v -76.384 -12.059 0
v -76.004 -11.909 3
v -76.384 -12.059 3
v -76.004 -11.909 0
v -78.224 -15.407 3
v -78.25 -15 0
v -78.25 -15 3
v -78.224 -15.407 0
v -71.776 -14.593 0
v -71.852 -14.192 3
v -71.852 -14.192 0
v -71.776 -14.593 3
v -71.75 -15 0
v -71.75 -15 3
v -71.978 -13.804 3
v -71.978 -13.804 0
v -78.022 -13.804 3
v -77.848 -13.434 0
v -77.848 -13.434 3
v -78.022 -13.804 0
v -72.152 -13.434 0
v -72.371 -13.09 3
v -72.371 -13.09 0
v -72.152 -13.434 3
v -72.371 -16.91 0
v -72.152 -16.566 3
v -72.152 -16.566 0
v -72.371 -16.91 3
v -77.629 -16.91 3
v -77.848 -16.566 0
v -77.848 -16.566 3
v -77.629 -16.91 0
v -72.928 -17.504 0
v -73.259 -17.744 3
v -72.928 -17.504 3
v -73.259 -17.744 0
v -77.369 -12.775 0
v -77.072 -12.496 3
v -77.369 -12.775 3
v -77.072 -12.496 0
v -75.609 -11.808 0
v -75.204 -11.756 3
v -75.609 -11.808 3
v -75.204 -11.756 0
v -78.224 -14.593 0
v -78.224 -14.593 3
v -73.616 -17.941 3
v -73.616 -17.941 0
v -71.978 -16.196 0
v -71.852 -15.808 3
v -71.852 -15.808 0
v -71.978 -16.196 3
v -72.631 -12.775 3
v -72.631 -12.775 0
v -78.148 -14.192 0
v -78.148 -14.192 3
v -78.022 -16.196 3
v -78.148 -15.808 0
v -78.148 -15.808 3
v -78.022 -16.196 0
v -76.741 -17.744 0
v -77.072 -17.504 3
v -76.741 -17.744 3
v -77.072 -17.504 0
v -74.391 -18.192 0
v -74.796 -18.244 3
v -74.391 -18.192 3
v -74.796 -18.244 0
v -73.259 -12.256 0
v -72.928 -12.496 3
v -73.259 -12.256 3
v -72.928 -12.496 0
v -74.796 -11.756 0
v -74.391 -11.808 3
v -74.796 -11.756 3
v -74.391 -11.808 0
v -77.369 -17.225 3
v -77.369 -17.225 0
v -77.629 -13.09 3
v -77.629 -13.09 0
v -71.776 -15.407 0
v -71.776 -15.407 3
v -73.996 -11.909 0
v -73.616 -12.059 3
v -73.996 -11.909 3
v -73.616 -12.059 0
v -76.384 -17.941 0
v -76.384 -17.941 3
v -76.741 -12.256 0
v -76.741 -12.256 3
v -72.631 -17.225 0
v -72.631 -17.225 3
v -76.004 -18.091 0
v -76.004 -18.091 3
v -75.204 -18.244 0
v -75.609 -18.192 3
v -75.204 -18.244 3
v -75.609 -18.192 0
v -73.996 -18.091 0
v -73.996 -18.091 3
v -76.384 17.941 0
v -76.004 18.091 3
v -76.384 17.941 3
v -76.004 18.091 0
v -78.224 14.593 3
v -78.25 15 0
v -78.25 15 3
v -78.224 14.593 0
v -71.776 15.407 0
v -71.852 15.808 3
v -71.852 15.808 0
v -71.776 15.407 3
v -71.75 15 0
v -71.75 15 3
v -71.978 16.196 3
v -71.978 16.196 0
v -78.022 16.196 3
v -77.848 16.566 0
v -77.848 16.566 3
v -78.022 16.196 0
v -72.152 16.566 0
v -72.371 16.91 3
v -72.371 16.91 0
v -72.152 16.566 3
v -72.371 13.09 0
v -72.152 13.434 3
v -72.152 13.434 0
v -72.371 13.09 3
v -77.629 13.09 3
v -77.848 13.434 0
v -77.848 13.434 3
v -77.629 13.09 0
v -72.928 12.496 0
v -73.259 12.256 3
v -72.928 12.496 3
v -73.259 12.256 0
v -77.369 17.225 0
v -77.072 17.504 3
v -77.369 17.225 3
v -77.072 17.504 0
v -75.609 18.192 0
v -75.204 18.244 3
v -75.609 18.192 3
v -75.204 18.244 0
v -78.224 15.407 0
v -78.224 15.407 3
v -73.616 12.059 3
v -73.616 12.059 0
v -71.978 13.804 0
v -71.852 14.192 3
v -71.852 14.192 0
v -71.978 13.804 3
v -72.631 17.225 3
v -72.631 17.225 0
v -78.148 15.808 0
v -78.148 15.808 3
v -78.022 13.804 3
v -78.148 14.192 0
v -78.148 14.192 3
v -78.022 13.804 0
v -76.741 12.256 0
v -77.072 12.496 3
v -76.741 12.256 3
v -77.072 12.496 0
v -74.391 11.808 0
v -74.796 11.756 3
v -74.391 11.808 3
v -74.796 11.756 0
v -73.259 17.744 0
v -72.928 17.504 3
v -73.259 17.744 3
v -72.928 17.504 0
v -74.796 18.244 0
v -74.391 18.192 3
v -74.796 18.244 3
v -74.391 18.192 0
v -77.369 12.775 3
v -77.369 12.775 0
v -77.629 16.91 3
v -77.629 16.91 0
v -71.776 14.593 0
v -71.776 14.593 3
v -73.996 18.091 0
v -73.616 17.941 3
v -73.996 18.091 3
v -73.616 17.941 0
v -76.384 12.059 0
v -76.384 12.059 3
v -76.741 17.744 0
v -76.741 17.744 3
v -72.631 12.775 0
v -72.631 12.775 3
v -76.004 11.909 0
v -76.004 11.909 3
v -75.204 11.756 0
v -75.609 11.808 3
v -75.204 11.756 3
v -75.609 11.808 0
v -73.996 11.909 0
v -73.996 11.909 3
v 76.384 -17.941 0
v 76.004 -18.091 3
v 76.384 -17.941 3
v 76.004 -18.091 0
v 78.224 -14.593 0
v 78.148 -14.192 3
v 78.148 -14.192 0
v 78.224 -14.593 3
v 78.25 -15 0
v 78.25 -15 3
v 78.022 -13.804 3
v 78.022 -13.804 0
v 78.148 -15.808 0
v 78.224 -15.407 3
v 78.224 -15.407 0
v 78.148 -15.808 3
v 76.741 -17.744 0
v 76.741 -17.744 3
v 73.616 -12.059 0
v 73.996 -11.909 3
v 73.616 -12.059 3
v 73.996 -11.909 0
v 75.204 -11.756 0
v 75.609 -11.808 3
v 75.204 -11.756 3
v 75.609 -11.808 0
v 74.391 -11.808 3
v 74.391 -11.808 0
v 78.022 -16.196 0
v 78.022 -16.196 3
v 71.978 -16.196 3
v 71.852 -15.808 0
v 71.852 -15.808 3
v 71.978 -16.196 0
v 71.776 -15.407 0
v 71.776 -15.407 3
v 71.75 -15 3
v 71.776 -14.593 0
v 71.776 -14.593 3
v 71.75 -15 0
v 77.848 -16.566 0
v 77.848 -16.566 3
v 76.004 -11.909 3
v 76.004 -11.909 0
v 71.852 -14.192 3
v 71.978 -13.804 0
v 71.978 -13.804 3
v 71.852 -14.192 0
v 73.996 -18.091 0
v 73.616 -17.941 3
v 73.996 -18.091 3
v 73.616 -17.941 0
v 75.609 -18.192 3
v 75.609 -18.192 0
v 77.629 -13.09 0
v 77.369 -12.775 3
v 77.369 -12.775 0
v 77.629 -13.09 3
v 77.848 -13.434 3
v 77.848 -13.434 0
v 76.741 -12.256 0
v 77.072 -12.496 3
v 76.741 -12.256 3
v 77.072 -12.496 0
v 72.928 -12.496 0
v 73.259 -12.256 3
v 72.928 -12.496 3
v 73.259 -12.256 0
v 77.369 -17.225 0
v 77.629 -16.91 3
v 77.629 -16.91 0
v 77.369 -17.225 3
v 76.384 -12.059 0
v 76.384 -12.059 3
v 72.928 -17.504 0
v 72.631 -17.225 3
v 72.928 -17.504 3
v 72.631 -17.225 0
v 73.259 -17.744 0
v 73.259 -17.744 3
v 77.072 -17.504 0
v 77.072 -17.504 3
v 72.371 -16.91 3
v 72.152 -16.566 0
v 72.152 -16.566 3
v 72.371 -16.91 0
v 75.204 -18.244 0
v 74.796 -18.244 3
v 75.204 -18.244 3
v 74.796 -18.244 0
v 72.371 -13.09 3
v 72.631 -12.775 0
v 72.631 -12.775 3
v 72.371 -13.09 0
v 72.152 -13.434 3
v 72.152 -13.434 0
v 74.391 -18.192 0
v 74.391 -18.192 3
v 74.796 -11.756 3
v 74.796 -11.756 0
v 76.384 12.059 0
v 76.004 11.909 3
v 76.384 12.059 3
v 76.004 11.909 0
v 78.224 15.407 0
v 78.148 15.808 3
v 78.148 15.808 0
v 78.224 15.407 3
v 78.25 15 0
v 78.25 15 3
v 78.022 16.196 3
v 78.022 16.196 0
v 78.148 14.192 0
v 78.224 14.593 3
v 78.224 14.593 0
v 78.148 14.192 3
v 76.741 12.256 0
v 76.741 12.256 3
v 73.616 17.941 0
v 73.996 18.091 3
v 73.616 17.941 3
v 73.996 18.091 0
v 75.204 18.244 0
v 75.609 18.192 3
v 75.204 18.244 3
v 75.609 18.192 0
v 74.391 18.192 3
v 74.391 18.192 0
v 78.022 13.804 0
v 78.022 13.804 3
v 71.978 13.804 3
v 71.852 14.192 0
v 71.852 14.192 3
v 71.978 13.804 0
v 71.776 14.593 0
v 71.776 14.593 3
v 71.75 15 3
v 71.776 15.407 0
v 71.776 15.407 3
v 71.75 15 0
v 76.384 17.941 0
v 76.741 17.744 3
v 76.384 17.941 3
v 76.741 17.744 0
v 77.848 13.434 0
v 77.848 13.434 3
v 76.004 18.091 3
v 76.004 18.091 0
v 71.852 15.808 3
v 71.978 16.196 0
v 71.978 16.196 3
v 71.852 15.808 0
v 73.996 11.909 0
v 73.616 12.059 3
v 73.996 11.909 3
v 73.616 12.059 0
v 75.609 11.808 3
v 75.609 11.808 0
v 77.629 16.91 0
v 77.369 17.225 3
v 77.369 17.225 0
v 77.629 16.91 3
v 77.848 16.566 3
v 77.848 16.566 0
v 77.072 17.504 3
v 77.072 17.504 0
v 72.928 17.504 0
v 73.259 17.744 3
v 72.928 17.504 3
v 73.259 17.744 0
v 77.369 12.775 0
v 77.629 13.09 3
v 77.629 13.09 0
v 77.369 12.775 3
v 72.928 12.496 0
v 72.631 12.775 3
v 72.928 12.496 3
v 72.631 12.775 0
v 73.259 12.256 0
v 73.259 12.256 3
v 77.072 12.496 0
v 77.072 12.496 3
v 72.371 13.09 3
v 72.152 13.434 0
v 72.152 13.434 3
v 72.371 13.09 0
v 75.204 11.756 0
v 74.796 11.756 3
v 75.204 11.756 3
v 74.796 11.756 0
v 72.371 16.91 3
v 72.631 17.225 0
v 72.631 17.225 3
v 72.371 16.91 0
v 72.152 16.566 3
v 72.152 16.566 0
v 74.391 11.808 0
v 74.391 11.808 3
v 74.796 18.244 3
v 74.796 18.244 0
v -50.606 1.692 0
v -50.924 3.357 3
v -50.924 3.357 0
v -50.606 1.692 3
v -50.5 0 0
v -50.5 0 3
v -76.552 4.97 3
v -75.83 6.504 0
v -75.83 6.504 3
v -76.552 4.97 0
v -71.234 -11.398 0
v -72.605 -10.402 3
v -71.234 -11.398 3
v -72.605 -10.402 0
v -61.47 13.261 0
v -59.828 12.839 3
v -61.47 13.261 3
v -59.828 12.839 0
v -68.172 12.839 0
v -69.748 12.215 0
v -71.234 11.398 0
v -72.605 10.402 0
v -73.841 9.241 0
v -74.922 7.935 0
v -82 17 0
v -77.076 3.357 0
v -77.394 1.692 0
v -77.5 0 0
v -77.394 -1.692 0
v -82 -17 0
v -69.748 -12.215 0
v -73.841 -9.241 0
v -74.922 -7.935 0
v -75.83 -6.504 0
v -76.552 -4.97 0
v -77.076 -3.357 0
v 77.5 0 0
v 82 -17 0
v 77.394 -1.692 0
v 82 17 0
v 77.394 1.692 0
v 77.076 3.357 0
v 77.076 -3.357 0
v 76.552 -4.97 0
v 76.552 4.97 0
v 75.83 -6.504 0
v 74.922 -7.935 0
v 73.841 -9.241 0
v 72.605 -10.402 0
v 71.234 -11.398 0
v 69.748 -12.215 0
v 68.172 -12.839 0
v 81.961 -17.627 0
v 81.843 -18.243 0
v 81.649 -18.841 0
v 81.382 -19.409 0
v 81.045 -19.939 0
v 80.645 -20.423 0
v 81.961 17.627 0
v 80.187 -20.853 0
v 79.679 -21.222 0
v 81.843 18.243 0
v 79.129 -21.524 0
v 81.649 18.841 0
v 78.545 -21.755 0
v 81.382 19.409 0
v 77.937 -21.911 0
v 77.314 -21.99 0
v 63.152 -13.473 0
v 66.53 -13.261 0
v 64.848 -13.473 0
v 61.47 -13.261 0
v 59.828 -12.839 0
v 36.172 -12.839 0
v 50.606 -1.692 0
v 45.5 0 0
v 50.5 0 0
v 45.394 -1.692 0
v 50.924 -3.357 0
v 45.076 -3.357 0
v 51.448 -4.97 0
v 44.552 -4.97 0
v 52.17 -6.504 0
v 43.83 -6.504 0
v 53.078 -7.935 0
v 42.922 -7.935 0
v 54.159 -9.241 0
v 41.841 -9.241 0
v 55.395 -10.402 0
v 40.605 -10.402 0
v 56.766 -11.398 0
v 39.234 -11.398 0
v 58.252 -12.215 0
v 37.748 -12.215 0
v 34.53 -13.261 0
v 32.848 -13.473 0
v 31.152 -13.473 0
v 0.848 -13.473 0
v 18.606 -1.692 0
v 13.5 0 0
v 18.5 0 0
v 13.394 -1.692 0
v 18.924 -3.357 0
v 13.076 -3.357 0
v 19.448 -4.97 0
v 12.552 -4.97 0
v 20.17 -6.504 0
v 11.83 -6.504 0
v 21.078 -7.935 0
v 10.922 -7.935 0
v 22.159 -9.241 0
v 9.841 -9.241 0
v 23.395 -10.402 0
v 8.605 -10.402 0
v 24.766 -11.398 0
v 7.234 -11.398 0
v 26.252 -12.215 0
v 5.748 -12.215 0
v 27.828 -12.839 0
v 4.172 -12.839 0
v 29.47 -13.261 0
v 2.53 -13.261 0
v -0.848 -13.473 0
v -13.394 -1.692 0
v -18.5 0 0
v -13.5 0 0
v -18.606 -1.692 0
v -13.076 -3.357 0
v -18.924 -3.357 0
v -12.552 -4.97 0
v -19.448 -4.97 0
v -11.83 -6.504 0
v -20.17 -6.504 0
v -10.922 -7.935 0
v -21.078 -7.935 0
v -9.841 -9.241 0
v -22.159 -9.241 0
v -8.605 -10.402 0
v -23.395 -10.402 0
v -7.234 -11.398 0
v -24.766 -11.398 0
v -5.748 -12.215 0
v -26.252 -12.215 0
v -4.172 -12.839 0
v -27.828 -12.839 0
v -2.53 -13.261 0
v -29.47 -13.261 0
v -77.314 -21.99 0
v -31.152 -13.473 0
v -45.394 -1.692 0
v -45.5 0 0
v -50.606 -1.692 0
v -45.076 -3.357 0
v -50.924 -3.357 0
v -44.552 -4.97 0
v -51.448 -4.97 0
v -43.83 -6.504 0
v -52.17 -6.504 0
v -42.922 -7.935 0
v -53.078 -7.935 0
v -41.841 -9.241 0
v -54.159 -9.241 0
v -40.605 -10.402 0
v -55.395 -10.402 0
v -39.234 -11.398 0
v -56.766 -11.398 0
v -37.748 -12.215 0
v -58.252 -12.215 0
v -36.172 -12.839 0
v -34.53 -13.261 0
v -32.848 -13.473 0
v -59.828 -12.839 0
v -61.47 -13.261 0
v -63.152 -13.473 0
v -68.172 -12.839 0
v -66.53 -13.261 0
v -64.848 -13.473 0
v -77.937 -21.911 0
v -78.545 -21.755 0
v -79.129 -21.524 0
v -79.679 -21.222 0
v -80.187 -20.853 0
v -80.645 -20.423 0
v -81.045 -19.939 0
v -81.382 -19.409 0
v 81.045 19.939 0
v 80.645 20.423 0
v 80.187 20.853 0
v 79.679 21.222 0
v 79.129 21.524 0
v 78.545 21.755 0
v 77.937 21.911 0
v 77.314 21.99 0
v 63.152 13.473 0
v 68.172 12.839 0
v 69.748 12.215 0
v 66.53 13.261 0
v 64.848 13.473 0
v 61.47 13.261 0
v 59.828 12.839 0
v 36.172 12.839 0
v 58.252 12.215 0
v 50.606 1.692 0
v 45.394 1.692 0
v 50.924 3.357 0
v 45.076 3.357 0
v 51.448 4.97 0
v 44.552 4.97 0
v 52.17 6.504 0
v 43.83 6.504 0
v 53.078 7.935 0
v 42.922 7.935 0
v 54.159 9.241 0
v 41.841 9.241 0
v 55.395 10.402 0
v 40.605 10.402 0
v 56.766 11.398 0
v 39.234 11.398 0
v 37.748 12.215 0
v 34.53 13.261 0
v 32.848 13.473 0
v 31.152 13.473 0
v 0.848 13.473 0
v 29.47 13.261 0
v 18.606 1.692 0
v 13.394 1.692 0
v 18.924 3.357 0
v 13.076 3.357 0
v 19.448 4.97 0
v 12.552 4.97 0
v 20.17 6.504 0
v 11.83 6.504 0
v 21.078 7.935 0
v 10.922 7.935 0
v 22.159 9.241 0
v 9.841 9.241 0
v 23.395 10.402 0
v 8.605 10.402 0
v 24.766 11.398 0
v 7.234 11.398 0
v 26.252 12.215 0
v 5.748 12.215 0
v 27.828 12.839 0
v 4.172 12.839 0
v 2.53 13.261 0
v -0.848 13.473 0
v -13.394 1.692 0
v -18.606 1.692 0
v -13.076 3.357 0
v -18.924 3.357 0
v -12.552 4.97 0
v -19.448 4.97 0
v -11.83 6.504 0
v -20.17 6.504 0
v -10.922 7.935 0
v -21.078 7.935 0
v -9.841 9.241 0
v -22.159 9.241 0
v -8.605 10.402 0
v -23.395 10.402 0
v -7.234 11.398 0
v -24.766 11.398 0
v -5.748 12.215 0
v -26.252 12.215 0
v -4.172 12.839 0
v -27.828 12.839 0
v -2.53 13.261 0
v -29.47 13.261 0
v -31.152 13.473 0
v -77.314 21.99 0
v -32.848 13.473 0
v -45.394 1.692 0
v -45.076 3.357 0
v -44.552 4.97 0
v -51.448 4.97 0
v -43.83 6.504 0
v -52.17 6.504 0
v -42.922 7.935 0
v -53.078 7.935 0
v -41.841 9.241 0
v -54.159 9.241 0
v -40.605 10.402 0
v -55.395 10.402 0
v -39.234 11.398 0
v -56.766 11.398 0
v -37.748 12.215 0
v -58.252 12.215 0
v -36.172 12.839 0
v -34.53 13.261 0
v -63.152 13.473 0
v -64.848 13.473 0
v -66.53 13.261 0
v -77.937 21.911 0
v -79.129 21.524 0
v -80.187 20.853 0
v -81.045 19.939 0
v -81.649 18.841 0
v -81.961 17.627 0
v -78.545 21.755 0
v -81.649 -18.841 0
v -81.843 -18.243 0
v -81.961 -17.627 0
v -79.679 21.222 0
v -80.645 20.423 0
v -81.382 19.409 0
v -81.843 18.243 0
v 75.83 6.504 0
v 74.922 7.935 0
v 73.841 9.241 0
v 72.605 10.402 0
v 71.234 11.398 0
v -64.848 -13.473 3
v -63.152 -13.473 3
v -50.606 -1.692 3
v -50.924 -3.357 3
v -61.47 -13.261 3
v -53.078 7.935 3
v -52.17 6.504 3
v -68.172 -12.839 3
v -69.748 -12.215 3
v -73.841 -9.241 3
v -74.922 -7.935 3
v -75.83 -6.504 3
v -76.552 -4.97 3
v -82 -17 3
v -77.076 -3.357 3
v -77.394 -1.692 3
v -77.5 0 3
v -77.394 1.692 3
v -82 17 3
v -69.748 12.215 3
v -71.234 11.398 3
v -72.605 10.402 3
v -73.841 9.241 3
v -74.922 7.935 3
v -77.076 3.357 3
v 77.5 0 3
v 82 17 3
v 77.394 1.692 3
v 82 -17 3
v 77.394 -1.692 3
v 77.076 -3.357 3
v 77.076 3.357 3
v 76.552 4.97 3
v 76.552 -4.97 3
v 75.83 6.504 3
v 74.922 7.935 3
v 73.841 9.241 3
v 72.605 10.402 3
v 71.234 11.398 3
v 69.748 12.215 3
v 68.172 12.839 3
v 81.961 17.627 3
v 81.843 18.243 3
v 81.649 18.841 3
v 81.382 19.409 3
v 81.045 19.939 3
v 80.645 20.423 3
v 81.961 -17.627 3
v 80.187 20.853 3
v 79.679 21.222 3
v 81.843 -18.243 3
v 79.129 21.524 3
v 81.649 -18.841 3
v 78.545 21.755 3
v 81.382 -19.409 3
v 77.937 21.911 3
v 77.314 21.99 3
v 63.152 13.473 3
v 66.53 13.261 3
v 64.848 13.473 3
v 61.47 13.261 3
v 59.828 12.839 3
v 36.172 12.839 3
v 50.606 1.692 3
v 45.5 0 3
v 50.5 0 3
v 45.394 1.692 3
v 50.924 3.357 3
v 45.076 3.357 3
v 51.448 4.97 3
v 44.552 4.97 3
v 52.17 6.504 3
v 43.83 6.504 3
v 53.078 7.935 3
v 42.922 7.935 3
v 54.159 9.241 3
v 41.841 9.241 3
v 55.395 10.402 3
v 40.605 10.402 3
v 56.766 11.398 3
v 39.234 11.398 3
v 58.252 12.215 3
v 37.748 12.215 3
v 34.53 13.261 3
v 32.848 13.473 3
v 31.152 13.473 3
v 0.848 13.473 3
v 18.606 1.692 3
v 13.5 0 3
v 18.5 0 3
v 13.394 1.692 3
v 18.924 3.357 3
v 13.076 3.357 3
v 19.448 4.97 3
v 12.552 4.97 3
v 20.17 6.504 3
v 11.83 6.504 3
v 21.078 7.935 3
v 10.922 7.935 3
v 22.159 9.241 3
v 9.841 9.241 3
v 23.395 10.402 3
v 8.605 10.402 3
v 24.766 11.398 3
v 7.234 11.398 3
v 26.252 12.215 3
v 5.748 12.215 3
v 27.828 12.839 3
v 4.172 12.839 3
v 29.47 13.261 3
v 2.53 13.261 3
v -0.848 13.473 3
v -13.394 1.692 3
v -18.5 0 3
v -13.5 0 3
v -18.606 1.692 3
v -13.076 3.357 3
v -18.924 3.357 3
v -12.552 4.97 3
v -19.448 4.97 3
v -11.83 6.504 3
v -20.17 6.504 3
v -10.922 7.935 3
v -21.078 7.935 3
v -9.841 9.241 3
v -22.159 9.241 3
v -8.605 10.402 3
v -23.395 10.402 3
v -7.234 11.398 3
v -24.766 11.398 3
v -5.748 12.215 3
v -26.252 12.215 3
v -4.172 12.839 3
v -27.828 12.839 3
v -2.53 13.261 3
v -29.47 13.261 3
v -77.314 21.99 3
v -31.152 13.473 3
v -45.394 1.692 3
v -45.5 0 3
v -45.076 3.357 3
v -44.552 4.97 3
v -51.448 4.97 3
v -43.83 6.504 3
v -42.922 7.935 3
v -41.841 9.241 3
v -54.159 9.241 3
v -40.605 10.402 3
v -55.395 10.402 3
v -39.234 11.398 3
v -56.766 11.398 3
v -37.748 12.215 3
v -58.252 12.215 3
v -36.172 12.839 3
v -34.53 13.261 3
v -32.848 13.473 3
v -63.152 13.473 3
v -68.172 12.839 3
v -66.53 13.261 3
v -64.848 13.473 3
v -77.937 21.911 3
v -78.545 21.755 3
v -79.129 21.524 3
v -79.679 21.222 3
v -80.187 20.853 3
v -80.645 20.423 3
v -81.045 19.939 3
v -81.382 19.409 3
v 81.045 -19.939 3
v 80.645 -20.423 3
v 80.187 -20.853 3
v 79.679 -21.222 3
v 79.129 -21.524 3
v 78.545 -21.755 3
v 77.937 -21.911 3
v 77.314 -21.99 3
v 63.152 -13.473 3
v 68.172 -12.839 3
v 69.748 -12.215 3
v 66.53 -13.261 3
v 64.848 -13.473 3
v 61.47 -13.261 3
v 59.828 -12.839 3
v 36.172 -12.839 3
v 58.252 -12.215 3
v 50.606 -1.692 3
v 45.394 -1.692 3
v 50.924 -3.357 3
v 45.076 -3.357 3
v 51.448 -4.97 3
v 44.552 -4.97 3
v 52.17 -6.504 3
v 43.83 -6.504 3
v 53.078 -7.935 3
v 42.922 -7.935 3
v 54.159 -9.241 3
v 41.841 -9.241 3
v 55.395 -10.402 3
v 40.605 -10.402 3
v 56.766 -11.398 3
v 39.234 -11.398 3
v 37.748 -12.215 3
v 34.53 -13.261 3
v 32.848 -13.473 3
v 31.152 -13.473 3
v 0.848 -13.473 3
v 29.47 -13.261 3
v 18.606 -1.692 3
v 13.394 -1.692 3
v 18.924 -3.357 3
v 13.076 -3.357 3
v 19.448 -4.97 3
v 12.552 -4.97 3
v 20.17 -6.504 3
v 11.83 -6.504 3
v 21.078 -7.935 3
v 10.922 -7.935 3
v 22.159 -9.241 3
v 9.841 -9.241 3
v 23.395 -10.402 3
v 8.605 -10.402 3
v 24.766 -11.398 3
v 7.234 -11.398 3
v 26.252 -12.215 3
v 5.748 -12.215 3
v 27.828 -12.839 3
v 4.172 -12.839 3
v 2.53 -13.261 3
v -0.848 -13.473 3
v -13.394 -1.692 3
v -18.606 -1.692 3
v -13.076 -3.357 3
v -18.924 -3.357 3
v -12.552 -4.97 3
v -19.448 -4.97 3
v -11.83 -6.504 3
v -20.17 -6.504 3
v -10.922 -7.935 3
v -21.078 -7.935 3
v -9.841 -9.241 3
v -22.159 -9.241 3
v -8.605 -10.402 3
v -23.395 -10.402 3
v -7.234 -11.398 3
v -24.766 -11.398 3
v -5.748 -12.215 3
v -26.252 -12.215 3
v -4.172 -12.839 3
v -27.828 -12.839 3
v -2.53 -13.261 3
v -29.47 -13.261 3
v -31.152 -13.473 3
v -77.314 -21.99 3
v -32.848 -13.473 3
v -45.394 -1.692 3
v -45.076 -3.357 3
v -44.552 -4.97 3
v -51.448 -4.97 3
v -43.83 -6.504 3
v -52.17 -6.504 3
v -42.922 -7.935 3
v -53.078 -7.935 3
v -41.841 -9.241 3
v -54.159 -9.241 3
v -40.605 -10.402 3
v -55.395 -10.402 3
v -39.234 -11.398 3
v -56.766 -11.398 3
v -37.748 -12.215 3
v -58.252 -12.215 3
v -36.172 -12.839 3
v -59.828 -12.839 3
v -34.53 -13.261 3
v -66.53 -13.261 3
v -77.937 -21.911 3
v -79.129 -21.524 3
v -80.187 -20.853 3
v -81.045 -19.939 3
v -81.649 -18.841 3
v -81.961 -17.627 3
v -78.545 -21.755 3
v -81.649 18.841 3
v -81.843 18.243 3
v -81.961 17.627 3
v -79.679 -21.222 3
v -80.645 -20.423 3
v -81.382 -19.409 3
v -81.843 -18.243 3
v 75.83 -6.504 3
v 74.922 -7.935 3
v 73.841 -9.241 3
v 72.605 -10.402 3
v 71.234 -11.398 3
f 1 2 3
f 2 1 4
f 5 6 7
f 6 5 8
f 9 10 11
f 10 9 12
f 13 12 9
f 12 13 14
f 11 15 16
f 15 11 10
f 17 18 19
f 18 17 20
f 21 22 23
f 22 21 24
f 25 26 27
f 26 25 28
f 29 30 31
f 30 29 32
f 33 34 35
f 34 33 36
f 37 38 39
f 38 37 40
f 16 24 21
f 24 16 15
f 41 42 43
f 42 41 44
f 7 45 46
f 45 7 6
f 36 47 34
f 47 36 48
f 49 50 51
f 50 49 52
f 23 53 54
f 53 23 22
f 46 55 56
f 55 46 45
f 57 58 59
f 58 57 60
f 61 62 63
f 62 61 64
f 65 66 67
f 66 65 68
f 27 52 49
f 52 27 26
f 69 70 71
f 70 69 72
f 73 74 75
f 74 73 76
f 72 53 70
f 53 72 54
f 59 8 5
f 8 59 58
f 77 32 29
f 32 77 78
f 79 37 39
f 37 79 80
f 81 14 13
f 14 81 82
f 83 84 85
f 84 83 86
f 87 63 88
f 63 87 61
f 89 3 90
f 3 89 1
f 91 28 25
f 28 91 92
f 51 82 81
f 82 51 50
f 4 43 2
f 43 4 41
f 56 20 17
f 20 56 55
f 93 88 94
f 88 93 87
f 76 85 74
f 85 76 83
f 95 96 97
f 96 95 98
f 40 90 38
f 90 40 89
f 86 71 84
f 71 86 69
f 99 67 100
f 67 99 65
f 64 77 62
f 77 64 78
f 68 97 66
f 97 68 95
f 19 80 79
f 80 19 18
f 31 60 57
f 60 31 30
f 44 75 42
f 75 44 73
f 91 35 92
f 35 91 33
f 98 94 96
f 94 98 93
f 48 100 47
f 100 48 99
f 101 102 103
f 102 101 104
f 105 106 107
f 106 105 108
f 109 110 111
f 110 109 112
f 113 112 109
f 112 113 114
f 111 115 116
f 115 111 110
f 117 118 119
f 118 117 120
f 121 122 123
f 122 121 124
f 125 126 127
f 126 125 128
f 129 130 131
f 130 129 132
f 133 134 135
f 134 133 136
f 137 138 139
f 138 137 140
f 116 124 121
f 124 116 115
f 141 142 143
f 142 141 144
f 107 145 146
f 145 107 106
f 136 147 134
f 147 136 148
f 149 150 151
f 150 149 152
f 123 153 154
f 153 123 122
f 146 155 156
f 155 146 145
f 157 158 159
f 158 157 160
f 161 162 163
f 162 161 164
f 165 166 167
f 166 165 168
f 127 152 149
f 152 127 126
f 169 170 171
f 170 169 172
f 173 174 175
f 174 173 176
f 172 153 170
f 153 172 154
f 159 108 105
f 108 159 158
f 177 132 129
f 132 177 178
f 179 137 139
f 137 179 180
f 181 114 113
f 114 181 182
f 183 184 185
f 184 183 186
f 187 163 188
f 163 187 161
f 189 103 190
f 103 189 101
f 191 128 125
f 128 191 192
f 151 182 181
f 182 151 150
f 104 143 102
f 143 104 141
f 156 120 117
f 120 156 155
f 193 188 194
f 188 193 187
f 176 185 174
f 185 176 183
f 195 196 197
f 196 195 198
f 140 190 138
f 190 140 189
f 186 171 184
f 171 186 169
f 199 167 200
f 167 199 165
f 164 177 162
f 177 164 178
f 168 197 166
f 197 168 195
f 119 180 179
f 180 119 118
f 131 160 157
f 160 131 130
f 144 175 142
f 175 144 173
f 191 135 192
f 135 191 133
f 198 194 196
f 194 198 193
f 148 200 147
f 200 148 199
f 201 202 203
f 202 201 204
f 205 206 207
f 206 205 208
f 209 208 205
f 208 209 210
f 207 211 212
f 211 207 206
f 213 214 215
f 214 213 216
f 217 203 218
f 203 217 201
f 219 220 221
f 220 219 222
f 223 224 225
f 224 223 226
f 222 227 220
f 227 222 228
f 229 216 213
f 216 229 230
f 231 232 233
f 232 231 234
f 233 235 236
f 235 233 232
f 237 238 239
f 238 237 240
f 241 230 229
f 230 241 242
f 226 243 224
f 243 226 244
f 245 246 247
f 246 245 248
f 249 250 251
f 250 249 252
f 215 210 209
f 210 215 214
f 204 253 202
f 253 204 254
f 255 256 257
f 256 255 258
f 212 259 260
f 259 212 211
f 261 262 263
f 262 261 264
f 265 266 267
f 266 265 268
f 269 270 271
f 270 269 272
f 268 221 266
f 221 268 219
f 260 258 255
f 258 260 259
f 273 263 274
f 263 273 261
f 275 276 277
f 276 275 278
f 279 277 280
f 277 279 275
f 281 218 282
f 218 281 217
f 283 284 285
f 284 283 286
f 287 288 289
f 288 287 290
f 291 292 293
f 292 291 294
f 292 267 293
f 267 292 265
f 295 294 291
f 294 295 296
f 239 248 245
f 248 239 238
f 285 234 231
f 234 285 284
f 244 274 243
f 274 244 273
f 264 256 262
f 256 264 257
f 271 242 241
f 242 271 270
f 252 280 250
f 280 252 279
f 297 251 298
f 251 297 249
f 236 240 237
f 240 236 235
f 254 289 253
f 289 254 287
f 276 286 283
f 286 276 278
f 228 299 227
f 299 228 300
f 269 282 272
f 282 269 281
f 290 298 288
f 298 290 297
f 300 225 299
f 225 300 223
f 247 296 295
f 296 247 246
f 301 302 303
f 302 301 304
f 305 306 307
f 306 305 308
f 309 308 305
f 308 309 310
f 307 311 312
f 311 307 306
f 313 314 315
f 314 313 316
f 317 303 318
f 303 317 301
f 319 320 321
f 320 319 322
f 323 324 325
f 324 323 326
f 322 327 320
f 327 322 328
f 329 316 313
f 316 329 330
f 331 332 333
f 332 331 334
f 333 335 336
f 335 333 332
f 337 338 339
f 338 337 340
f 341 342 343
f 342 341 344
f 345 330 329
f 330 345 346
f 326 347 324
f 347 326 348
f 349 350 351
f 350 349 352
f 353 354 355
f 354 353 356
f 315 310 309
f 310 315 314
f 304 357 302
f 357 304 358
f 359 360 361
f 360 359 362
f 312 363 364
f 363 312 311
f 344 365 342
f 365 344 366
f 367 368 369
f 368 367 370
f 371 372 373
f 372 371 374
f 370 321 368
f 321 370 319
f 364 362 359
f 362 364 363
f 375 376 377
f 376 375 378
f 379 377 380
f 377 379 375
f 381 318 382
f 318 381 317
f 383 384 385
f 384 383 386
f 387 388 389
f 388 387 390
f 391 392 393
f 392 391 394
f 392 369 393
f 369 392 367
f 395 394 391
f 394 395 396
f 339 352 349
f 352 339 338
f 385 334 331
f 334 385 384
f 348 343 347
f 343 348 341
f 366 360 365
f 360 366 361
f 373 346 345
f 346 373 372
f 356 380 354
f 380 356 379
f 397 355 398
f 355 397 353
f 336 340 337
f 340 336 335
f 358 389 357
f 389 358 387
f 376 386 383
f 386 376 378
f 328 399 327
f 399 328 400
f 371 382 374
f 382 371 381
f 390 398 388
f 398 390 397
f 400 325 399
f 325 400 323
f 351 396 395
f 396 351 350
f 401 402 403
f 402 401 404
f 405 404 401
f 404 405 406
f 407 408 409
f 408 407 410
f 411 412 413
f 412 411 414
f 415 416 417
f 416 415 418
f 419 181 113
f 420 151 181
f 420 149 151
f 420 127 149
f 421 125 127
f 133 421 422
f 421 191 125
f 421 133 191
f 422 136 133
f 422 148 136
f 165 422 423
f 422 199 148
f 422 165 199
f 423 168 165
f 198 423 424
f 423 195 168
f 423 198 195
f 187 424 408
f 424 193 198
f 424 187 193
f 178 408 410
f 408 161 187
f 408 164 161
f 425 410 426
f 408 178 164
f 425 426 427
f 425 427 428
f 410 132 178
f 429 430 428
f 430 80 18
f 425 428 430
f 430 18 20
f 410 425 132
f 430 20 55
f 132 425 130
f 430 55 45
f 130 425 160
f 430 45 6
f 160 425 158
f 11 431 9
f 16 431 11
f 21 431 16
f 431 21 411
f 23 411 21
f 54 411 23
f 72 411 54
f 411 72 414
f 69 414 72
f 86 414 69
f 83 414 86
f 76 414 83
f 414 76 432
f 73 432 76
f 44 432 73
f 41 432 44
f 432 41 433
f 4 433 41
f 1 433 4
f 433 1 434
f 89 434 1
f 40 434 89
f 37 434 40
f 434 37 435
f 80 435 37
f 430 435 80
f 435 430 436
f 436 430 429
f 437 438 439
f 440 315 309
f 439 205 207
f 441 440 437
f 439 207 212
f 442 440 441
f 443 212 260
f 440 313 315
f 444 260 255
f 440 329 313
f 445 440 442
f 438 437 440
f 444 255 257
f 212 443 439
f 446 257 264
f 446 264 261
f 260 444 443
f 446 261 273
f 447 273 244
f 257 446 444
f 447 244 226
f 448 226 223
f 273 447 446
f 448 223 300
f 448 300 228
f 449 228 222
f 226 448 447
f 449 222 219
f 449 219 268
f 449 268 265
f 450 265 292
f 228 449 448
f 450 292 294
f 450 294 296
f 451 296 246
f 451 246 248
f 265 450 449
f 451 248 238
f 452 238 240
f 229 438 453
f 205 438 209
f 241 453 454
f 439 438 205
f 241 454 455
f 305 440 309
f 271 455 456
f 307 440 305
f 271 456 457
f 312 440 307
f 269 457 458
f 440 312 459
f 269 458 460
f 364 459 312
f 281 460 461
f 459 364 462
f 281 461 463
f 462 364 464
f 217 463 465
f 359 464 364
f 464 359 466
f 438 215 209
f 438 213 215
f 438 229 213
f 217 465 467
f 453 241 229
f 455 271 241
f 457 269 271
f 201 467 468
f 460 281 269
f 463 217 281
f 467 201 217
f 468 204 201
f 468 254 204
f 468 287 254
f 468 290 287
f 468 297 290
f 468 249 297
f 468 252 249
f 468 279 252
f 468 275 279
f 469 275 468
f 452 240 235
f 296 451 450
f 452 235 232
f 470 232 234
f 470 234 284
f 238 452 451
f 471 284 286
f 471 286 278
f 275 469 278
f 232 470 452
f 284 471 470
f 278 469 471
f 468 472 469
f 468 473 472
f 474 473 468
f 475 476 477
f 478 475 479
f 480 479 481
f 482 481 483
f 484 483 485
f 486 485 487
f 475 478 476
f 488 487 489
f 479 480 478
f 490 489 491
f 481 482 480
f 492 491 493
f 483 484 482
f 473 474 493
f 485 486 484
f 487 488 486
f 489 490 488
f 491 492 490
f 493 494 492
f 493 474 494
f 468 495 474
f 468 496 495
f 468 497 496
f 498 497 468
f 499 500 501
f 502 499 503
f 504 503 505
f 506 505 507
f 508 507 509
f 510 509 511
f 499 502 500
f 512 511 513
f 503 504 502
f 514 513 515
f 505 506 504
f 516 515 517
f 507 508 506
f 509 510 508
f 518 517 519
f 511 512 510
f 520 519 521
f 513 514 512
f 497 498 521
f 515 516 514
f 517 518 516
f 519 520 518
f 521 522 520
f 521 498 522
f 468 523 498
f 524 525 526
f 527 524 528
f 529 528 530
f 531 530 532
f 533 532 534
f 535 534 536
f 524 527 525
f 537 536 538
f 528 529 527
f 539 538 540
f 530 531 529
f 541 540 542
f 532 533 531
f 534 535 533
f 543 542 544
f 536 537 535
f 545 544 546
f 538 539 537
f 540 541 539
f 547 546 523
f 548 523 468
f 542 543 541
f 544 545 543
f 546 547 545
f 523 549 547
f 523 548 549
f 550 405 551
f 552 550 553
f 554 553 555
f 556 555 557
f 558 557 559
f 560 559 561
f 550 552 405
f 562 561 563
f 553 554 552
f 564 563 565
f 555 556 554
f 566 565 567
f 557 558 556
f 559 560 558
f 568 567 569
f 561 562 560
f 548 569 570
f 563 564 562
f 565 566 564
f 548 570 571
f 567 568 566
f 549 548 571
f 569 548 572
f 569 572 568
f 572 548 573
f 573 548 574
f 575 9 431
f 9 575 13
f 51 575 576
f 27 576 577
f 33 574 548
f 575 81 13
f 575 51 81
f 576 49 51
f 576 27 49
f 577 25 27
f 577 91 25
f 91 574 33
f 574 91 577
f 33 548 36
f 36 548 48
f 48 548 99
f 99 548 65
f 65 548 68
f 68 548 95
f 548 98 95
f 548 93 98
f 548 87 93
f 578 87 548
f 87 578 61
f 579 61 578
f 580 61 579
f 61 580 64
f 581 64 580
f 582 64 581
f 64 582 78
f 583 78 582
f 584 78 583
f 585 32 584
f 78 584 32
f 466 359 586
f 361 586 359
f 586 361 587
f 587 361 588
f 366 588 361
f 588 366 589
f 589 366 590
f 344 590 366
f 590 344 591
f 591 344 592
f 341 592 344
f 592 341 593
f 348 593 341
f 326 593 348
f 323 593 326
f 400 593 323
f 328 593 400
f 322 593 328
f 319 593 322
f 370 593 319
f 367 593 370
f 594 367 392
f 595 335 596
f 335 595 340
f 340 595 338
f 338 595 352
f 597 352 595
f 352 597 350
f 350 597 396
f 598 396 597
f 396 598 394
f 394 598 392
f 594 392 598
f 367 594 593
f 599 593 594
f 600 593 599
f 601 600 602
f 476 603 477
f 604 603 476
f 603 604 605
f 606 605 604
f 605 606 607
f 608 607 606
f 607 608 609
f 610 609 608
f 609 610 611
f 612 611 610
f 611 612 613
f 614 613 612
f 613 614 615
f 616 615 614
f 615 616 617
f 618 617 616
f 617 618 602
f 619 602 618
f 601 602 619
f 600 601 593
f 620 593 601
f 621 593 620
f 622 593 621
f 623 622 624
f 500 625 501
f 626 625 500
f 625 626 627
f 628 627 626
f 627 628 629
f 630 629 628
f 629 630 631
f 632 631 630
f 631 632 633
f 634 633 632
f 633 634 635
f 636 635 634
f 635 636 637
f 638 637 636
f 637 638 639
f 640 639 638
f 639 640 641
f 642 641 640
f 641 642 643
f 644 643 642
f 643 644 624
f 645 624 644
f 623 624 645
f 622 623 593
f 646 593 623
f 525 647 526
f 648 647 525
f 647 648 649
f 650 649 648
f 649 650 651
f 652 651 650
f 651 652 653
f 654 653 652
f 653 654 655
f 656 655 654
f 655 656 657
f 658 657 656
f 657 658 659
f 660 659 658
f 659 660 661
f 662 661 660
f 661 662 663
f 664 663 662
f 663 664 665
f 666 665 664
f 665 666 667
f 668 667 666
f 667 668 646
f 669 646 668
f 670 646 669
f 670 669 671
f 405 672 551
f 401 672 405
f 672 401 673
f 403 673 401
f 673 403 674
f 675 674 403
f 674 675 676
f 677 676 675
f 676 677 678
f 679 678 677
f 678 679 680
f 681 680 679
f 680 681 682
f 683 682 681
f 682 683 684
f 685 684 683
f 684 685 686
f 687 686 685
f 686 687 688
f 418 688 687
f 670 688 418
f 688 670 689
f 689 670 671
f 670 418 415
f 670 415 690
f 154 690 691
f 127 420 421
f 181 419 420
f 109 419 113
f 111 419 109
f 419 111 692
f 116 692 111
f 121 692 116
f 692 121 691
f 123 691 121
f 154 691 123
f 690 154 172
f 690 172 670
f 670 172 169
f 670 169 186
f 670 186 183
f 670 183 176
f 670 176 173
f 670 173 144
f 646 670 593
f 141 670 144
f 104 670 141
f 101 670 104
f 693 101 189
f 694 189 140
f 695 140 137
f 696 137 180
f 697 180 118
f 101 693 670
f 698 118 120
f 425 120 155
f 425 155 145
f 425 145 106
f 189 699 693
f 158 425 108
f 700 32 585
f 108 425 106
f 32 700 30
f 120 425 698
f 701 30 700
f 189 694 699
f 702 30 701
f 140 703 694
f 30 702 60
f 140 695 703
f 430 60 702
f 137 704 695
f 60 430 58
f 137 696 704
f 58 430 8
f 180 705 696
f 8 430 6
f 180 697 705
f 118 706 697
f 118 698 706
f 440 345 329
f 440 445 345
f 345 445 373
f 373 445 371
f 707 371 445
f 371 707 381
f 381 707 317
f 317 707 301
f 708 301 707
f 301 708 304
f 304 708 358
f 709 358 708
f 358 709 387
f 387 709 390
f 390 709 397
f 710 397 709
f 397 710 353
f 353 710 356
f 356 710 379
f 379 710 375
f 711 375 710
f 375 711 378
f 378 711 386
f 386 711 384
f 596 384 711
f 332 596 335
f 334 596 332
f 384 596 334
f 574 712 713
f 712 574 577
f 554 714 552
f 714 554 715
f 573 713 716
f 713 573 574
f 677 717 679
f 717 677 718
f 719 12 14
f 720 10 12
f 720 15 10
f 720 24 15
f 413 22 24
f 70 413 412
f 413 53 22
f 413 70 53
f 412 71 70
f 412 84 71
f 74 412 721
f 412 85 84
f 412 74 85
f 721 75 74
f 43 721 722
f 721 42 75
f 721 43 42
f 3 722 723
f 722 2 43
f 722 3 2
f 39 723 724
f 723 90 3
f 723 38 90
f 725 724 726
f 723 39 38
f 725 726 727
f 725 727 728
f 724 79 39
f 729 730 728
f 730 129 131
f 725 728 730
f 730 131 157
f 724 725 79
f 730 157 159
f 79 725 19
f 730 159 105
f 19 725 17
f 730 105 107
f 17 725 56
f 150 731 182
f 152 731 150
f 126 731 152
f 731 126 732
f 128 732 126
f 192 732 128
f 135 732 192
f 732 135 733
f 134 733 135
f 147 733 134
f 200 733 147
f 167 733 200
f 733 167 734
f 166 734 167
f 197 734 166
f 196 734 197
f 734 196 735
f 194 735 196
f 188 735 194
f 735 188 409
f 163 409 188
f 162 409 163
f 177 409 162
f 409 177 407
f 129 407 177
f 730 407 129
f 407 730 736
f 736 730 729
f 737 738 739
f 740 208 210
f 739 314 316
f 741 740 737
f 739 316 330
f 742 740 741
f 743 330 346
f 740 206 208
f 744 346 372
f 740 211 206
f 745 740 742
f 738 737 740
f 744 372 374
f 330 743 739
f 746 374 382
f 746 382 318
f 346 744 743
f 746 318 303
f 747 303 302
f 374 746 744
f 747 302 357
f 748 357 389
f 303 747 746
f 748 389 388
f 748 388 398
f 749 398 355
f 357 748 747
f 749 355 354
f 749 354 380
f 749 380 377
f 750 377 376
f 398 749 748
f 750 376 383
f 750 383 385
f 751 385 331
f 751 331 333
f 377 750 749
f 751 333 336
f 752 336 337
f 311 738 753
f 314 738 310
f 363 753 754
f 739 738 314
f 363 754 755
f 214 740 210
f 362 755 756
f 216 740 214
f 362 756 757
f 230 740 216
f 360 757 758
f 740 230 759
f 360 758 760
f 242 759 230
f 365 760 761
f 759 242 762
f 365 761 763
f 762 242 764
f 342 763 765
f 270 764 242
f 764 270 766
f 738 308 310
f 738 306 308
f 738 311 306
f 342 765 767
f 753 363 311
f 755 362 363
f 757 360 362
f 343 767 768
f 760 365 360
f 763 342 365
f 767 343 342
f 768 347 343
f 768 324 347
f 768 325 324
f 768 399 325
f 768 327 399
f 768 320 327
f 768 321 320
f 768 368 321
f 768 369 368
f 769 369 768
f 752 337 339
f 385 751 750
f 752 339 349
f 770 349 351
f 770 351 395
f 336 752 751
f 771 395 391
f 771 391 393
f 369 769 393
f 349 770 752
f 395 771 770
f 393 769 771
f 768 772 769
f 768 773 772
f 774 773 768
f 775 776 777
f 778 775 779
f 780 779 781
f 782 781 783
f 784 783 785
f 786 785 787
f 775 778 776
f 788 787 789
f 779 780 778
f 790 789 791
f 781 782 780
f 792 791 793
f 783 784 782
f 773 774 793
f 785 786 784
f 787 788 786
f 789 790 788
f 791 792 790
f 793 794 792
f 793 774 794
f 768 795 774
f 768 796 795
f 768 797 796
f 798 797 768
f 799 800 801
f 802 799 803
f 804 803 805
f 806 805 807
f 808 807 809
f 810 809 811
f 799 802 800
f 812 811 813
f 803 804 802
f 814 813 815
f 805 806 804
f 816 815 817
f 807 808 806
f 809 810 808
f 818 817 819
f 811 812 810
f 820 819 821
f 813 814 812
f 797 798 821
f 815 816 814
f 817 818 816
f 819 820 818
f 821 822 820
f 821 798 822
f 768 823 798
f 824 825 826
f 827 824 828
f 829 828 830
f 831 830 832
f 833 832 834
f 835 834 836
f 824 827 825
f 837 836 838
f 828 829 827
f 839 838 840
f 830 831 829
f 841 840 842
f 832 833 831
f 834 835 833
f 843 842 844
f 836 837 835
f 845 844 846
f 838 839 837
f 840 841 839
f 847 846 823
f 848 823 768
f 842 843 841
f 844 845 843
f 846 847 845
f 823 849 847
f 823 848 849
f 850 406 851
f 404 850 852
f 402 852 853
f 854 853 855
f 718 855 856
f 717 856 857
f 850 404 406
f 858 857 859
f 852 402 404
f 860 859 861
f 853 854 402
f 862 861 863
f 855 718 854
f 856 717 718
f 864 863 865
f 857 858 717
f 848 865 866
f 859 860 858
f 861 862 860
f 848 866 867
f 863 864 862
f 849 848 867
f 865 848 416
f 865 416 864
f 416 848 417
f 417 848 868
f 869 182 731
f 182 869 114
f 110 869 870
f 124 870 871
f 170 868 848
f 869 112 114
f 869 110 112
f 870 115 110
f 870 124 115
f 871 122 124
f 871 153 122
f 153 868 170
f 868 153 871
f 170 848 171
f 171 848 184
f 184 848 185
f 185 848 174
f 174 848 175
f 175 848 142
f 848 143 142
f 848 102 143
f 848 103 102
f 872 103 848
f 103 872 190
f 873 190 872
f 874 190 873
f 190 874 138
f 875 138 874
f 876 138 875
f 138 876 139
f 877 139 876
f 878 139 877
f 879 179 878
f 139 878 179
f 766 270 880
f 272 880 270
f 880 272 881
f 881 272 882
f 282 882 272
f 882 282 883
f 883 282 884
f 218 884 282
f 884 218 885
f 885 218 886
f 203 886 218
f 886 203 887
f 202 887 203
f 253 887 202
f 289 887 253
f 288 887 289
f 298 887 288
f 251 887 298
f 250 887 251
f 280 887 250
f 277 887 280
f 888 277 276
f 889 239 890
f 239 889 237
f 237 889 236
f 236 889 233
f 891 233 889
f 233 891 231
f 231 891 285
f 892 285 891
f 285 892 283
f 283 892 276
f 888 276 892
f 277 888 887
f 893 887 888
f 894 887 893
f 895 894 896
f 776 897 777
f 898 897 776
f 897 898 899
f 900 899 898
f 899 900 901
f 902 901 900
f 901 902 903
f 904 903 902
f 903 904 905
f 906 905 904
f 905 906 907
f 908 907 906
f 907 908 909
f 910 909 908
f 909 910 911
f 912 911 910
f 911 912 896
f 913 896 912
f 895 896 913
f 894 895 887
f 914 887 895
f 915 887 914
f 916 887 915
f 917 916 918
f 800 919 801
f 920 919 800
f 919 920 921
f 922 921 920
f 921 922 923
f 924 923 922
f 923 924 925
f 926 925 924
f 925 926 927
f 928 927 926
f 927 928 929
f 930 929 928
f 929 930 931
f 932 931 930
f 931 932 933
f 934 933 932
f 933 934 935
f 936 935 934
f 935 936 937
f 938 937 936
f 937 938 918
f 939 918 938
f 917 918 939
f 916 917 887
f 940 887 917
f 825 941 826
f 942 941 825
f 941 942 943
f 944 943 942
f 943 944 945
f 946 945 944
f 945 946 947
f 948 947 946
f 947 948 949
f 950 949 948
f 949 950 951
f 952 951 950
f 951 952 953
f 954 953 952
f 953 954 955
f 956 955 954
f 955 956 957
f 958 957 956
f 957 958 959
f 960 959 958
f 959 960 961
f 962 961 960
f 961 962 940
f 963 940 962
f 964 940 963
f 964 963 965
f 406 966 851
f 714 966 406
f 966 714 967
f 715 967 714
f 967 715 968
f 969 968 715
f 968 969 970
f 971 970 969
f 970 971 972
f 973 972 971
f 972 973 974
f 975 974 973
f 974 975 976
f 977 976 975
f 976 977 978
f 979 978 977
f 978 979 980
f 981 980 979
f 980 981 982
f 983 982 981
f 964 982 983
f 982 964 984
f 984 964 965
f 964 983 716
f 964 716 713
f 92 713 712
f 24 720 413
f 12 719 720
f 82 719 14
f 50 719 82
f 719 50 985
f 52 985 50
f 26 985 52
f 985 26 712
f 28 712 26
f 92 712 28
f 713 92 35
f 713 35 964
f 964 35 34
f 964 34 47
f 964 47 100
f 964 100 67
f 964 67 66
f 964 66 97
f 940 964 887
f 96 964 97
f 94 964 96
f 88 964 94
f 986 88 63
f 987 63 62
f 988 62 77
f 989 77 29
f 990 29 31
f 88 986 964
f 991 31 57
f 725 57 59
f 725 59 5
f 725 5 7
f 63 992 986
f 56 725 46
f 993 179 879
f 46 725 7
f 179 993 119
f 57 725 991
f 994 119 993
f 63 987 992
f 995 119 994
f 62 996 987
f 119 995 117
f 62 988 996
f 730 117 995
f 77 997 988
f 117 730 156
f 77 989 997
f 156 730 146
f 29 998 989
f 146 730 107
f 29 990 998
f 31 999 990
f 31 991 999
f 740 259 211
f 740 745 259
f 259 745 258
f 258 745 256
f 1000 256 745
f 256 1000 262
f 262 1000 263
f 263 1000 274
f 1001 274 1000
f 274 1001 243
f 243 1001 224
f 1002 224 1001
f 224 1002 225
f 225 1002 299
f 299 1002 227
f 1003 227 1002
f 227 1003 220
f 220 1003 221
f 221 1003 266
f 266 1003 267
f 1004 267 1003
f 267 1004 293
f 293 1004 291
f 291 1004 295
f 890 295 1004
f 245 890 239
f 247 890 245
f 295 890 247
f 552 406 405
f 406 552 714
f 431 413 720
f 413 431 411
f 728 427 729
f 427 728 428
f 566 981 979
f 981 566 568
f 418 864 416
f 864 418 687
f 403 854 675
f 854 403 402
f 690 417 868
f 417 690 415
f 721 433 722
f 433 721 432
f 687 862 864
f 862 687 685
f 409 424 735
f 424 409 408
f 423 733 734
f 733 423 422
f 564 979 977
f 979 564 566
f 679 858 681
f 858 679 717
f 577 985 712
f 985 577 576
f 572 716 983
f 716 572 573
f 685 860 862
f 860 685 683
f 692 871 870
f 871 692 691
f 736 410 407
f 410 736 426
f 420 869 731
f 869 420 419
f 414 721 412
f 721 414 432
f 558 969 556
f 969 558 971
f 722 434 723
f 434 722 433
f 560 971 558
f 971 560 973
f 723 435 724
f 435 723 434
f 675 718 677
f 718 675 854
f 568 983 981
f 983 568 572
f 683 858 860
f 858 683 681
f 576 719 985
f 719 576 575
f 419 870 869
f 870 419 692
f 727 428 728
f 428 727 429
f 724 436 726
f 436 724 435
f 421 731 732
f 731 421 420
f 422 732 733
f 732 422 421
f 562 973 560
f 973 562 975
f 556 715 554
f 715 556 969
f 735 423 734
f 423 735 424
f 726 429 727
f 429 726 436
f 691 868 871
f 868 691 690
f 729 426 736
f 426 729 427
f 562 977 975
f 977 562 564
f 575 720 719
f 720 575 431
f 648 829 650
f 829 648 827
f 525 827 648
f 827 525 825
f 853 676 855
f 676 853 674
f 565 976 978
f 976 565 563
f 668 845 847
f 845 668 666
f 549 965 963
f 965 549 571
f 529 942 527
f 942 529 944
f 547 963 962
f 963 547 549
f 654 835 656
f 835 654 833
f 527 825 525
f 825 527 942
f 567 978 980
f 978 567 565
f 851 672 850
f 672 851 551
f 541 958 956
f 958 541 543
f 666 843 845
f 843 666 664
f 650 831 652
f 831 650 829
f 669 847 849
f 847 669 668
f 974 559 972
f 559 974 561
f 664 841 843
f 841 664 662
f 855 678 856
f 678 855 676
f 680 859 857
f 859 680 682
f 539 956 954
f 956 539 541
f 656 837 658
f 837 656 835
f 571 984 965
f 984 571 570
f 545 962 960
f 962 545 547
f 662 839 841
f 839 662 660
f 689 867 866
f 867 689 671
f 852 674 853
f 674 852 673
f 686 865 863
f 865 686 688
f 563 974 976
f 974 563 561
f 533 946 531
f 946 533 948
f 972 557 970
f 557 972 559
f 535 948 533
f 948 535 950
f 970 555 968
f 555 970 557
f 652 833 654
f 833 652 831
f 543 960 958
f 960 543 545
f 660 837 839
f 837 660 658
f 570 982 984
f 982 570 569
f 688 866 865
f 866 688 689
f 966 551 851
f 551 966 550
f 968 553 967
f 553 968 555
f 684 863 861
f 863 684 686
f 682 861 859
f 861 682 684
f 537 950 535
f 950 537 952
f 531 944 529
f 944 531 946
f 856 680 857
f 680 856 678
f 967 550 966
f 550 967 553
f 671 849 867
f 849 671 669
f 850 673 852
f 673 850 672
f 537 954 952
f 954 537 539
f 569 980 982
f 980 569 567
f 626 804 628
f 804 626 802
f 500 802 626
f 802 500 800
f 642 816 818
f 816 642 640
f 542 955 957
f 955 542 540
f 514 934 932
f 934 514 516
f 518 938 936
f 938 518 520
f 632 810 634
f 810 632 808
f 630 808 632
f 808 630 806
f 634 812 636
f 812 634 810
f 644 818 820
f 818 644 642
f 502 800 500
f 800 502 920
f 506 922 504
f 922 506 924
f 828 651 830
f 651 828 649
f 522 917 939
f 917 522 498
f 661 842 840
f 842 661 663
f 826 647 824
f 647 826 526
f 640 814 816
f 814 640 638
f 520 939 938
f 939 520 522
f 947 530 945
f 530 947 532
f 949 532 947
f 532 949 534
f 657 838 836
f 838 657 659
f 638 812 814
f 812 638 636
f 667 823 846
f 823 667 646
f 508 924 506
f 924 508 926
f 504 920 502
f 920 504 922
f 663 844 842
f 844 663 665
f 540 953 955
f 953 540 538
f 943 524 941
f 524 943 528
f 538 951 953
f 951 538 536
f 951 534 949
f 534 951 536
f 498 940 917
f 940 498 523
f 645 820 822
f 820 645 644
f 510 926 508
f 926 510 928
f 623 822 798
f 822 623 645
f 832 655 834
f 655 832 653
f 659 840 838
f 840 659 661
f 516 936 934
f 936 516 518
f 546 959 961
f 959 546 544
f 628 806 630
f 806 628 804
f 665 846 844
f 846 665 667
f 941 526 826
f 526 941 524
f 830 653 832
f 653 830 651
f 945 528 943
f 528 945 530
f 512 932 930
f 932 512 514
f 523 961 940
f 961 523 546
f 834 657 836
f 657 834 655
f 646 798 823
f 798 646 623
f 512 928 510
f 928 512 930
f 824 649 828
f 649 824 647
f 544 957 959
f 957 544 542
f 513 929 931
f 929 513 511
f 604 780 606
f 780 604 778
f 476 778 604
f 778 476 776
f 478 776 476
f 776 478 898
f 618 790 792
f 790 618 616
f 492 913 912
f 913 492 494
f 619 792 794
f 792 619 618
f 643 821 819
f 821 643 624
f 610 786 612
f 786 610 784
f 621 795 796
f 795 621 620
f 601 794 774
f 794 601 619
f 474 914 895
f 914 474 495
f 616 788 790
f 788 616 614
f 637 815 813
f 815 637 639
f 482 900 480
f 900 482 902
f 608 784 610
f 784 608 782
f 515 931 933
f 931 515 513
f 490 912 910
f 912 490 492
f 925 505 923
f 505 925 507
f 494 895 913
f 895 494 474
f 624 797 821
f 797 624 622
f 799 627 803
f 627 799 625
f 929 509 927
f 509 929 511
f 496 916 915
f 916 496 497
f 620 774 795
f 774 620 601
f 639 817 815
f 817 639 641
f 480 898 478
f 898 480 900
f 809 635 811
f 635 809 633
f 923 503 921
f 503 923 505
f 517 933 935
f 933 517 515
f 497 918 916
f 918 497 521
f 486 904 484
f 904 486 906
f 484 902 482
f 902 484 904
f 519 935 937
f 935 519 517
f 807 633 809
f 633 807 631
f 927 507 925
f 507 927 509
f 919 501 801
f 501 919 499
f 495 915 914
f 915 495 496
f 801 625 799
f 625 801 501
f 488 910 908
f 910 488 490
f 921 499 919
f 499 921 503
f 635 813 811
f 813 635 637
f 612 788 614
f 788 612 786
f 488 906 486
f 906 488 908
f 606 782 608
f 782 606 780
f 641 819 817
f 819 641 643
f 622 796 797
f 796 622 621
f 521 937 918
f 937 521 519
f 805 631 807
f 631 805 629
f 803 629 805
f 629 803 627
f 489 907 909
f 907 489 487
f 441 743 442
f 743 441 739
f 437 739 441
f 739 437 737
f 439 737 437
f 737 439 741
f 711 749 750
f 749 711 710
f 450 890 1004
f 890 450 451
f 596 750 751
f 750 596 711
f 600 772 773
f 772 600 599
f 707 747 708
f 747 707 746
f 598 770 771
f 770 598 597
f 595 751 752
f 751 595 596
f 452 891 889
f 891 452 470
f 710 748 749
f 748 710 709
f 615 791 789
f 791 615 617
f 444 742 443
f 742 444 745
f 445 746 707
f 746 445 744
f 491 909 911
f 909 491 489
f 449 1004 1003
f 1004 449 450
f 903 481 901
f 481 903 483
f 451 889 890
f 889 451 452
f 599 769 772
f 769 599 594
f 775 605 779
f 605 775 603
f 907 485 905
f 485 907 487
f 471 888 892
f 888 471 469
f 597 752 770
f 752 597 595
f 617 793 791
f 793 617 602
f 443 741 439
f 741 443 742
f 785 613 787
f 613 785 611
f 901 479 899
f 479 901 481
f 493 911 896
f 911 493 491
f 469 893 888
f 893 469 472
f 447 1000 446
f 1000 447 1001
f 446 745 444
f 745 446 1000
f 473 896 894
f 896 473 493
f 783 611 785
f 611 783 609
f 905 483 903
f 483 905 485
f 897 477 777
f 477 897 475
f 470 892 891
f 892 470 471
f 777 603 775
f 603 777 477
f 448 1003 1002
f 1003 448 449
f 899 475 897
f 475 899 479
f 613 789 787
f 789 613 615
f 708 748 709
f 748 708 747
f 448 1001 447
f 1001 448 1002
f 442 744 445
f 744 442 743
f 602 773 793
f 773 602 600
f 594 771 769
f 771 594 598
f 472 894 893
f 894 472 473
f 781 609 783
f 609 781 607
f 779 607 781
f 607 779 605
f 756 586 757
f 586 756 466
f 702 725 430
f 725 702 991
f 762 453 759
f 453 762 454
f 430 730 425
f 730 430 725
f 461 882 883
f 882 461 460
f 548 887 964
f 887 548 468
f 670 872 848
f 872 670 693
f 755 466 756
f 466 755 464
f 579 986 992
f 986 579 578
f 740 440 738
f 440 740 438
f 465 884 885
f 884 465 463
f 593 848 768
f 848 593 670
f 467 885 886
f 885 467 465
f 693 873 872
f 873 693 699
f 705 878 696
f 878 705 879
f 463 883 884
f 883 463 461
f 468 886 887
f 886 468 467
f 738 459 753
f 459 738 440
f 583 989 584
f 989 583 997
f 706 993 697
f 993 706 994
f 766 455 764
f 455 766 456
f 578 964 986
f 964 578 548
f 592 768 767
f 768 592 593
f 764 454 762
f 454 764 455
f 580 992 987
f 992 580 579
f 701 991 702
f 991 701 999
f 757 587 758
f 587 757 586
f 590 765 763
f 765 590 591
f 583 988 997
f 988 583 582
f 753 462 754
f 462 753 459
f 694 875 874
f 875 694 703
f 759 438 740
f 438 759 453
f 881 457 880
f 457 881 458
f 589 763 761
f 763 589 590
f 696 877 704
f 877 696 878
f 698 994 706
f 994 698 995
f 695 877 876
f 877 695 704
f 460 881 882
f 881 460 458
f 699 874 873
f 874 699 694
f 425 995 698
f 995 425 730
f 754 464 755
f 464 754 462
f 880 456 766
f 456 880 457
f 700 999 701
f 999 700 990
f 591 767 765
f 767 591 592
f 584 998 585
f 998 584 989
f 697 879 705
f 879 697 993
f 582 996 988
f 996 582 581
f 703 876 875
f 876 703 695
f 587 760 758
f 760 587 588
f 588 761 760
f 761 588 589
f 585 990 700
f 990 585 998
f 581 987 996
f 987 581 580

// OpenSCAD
$fn = 50;

difference() {
	union() {
		hull() {
			translate(v = [-77.0, 17.0, 0]) {
				cylinder(h = 3, r = 5);
			}
			translate(v = [77.0, 17.0, 0]) {
				cylinder(h = 3, r = 5);
			}
			translate(v = [-77.0, -17.0, 0]) {
				cylinder(h = 3, r = 5);
			}
			translate(v = [77.0, -17.0, 0]) {
				cylinder(h = 3, r = 5);
			}
		}
	}
	union() {
		translate(v = [-75.0, -15.0, -100.0]) {
			cylinder(h = 200, r = 3.25);
		}
		translate(v = [-75.0, 15.0, -100.0]) {
			cylinder(h = 200, r = 3.25);
		}
		translate(v = [75.0, -15.0, -100.0]) {
			cylinder(h = 200, r = 3.25);
		}
		translate(v = [75.0, 15.0, -100.0]) {
			cylinder(h = 200, r = 3.25);
		}
		translate(v = [-75.0, -15.0, -100.0]) {
			cylinder(h = 200, r = 1.8);
		}
		translate(v = [-75.0, 15.0, -100.0]) {
			cylinder(h = 200, r = 1.8);
		}
		translate(v = [75.0, -15.0, -100.0]) {
			cylinder(h = 200, r = 1.8);
		}
		translate(v = [75.0, 15.0, -100.0]) {
			cylinder(h = 200, r = 1.8);
		}
		translate(v = [-64.0, 0, 0.0]) {
			cylinder(h = 3, r = 13.5);
		}
		translate(v = [-32.0, 0, 0.0]) {
			cylinder(h = 3, r = 13.5);
		}
		cylinder(h = 3, r = 13.5);
		translate(v = [32.0, 0, 0.0]) {
			cylinder(h = 3, r = 13.5);
		}
		translate(v = [64.0, 0, 0.0]) {
			cylinder(h = 3, r = 13.5);
		}
	}
}
